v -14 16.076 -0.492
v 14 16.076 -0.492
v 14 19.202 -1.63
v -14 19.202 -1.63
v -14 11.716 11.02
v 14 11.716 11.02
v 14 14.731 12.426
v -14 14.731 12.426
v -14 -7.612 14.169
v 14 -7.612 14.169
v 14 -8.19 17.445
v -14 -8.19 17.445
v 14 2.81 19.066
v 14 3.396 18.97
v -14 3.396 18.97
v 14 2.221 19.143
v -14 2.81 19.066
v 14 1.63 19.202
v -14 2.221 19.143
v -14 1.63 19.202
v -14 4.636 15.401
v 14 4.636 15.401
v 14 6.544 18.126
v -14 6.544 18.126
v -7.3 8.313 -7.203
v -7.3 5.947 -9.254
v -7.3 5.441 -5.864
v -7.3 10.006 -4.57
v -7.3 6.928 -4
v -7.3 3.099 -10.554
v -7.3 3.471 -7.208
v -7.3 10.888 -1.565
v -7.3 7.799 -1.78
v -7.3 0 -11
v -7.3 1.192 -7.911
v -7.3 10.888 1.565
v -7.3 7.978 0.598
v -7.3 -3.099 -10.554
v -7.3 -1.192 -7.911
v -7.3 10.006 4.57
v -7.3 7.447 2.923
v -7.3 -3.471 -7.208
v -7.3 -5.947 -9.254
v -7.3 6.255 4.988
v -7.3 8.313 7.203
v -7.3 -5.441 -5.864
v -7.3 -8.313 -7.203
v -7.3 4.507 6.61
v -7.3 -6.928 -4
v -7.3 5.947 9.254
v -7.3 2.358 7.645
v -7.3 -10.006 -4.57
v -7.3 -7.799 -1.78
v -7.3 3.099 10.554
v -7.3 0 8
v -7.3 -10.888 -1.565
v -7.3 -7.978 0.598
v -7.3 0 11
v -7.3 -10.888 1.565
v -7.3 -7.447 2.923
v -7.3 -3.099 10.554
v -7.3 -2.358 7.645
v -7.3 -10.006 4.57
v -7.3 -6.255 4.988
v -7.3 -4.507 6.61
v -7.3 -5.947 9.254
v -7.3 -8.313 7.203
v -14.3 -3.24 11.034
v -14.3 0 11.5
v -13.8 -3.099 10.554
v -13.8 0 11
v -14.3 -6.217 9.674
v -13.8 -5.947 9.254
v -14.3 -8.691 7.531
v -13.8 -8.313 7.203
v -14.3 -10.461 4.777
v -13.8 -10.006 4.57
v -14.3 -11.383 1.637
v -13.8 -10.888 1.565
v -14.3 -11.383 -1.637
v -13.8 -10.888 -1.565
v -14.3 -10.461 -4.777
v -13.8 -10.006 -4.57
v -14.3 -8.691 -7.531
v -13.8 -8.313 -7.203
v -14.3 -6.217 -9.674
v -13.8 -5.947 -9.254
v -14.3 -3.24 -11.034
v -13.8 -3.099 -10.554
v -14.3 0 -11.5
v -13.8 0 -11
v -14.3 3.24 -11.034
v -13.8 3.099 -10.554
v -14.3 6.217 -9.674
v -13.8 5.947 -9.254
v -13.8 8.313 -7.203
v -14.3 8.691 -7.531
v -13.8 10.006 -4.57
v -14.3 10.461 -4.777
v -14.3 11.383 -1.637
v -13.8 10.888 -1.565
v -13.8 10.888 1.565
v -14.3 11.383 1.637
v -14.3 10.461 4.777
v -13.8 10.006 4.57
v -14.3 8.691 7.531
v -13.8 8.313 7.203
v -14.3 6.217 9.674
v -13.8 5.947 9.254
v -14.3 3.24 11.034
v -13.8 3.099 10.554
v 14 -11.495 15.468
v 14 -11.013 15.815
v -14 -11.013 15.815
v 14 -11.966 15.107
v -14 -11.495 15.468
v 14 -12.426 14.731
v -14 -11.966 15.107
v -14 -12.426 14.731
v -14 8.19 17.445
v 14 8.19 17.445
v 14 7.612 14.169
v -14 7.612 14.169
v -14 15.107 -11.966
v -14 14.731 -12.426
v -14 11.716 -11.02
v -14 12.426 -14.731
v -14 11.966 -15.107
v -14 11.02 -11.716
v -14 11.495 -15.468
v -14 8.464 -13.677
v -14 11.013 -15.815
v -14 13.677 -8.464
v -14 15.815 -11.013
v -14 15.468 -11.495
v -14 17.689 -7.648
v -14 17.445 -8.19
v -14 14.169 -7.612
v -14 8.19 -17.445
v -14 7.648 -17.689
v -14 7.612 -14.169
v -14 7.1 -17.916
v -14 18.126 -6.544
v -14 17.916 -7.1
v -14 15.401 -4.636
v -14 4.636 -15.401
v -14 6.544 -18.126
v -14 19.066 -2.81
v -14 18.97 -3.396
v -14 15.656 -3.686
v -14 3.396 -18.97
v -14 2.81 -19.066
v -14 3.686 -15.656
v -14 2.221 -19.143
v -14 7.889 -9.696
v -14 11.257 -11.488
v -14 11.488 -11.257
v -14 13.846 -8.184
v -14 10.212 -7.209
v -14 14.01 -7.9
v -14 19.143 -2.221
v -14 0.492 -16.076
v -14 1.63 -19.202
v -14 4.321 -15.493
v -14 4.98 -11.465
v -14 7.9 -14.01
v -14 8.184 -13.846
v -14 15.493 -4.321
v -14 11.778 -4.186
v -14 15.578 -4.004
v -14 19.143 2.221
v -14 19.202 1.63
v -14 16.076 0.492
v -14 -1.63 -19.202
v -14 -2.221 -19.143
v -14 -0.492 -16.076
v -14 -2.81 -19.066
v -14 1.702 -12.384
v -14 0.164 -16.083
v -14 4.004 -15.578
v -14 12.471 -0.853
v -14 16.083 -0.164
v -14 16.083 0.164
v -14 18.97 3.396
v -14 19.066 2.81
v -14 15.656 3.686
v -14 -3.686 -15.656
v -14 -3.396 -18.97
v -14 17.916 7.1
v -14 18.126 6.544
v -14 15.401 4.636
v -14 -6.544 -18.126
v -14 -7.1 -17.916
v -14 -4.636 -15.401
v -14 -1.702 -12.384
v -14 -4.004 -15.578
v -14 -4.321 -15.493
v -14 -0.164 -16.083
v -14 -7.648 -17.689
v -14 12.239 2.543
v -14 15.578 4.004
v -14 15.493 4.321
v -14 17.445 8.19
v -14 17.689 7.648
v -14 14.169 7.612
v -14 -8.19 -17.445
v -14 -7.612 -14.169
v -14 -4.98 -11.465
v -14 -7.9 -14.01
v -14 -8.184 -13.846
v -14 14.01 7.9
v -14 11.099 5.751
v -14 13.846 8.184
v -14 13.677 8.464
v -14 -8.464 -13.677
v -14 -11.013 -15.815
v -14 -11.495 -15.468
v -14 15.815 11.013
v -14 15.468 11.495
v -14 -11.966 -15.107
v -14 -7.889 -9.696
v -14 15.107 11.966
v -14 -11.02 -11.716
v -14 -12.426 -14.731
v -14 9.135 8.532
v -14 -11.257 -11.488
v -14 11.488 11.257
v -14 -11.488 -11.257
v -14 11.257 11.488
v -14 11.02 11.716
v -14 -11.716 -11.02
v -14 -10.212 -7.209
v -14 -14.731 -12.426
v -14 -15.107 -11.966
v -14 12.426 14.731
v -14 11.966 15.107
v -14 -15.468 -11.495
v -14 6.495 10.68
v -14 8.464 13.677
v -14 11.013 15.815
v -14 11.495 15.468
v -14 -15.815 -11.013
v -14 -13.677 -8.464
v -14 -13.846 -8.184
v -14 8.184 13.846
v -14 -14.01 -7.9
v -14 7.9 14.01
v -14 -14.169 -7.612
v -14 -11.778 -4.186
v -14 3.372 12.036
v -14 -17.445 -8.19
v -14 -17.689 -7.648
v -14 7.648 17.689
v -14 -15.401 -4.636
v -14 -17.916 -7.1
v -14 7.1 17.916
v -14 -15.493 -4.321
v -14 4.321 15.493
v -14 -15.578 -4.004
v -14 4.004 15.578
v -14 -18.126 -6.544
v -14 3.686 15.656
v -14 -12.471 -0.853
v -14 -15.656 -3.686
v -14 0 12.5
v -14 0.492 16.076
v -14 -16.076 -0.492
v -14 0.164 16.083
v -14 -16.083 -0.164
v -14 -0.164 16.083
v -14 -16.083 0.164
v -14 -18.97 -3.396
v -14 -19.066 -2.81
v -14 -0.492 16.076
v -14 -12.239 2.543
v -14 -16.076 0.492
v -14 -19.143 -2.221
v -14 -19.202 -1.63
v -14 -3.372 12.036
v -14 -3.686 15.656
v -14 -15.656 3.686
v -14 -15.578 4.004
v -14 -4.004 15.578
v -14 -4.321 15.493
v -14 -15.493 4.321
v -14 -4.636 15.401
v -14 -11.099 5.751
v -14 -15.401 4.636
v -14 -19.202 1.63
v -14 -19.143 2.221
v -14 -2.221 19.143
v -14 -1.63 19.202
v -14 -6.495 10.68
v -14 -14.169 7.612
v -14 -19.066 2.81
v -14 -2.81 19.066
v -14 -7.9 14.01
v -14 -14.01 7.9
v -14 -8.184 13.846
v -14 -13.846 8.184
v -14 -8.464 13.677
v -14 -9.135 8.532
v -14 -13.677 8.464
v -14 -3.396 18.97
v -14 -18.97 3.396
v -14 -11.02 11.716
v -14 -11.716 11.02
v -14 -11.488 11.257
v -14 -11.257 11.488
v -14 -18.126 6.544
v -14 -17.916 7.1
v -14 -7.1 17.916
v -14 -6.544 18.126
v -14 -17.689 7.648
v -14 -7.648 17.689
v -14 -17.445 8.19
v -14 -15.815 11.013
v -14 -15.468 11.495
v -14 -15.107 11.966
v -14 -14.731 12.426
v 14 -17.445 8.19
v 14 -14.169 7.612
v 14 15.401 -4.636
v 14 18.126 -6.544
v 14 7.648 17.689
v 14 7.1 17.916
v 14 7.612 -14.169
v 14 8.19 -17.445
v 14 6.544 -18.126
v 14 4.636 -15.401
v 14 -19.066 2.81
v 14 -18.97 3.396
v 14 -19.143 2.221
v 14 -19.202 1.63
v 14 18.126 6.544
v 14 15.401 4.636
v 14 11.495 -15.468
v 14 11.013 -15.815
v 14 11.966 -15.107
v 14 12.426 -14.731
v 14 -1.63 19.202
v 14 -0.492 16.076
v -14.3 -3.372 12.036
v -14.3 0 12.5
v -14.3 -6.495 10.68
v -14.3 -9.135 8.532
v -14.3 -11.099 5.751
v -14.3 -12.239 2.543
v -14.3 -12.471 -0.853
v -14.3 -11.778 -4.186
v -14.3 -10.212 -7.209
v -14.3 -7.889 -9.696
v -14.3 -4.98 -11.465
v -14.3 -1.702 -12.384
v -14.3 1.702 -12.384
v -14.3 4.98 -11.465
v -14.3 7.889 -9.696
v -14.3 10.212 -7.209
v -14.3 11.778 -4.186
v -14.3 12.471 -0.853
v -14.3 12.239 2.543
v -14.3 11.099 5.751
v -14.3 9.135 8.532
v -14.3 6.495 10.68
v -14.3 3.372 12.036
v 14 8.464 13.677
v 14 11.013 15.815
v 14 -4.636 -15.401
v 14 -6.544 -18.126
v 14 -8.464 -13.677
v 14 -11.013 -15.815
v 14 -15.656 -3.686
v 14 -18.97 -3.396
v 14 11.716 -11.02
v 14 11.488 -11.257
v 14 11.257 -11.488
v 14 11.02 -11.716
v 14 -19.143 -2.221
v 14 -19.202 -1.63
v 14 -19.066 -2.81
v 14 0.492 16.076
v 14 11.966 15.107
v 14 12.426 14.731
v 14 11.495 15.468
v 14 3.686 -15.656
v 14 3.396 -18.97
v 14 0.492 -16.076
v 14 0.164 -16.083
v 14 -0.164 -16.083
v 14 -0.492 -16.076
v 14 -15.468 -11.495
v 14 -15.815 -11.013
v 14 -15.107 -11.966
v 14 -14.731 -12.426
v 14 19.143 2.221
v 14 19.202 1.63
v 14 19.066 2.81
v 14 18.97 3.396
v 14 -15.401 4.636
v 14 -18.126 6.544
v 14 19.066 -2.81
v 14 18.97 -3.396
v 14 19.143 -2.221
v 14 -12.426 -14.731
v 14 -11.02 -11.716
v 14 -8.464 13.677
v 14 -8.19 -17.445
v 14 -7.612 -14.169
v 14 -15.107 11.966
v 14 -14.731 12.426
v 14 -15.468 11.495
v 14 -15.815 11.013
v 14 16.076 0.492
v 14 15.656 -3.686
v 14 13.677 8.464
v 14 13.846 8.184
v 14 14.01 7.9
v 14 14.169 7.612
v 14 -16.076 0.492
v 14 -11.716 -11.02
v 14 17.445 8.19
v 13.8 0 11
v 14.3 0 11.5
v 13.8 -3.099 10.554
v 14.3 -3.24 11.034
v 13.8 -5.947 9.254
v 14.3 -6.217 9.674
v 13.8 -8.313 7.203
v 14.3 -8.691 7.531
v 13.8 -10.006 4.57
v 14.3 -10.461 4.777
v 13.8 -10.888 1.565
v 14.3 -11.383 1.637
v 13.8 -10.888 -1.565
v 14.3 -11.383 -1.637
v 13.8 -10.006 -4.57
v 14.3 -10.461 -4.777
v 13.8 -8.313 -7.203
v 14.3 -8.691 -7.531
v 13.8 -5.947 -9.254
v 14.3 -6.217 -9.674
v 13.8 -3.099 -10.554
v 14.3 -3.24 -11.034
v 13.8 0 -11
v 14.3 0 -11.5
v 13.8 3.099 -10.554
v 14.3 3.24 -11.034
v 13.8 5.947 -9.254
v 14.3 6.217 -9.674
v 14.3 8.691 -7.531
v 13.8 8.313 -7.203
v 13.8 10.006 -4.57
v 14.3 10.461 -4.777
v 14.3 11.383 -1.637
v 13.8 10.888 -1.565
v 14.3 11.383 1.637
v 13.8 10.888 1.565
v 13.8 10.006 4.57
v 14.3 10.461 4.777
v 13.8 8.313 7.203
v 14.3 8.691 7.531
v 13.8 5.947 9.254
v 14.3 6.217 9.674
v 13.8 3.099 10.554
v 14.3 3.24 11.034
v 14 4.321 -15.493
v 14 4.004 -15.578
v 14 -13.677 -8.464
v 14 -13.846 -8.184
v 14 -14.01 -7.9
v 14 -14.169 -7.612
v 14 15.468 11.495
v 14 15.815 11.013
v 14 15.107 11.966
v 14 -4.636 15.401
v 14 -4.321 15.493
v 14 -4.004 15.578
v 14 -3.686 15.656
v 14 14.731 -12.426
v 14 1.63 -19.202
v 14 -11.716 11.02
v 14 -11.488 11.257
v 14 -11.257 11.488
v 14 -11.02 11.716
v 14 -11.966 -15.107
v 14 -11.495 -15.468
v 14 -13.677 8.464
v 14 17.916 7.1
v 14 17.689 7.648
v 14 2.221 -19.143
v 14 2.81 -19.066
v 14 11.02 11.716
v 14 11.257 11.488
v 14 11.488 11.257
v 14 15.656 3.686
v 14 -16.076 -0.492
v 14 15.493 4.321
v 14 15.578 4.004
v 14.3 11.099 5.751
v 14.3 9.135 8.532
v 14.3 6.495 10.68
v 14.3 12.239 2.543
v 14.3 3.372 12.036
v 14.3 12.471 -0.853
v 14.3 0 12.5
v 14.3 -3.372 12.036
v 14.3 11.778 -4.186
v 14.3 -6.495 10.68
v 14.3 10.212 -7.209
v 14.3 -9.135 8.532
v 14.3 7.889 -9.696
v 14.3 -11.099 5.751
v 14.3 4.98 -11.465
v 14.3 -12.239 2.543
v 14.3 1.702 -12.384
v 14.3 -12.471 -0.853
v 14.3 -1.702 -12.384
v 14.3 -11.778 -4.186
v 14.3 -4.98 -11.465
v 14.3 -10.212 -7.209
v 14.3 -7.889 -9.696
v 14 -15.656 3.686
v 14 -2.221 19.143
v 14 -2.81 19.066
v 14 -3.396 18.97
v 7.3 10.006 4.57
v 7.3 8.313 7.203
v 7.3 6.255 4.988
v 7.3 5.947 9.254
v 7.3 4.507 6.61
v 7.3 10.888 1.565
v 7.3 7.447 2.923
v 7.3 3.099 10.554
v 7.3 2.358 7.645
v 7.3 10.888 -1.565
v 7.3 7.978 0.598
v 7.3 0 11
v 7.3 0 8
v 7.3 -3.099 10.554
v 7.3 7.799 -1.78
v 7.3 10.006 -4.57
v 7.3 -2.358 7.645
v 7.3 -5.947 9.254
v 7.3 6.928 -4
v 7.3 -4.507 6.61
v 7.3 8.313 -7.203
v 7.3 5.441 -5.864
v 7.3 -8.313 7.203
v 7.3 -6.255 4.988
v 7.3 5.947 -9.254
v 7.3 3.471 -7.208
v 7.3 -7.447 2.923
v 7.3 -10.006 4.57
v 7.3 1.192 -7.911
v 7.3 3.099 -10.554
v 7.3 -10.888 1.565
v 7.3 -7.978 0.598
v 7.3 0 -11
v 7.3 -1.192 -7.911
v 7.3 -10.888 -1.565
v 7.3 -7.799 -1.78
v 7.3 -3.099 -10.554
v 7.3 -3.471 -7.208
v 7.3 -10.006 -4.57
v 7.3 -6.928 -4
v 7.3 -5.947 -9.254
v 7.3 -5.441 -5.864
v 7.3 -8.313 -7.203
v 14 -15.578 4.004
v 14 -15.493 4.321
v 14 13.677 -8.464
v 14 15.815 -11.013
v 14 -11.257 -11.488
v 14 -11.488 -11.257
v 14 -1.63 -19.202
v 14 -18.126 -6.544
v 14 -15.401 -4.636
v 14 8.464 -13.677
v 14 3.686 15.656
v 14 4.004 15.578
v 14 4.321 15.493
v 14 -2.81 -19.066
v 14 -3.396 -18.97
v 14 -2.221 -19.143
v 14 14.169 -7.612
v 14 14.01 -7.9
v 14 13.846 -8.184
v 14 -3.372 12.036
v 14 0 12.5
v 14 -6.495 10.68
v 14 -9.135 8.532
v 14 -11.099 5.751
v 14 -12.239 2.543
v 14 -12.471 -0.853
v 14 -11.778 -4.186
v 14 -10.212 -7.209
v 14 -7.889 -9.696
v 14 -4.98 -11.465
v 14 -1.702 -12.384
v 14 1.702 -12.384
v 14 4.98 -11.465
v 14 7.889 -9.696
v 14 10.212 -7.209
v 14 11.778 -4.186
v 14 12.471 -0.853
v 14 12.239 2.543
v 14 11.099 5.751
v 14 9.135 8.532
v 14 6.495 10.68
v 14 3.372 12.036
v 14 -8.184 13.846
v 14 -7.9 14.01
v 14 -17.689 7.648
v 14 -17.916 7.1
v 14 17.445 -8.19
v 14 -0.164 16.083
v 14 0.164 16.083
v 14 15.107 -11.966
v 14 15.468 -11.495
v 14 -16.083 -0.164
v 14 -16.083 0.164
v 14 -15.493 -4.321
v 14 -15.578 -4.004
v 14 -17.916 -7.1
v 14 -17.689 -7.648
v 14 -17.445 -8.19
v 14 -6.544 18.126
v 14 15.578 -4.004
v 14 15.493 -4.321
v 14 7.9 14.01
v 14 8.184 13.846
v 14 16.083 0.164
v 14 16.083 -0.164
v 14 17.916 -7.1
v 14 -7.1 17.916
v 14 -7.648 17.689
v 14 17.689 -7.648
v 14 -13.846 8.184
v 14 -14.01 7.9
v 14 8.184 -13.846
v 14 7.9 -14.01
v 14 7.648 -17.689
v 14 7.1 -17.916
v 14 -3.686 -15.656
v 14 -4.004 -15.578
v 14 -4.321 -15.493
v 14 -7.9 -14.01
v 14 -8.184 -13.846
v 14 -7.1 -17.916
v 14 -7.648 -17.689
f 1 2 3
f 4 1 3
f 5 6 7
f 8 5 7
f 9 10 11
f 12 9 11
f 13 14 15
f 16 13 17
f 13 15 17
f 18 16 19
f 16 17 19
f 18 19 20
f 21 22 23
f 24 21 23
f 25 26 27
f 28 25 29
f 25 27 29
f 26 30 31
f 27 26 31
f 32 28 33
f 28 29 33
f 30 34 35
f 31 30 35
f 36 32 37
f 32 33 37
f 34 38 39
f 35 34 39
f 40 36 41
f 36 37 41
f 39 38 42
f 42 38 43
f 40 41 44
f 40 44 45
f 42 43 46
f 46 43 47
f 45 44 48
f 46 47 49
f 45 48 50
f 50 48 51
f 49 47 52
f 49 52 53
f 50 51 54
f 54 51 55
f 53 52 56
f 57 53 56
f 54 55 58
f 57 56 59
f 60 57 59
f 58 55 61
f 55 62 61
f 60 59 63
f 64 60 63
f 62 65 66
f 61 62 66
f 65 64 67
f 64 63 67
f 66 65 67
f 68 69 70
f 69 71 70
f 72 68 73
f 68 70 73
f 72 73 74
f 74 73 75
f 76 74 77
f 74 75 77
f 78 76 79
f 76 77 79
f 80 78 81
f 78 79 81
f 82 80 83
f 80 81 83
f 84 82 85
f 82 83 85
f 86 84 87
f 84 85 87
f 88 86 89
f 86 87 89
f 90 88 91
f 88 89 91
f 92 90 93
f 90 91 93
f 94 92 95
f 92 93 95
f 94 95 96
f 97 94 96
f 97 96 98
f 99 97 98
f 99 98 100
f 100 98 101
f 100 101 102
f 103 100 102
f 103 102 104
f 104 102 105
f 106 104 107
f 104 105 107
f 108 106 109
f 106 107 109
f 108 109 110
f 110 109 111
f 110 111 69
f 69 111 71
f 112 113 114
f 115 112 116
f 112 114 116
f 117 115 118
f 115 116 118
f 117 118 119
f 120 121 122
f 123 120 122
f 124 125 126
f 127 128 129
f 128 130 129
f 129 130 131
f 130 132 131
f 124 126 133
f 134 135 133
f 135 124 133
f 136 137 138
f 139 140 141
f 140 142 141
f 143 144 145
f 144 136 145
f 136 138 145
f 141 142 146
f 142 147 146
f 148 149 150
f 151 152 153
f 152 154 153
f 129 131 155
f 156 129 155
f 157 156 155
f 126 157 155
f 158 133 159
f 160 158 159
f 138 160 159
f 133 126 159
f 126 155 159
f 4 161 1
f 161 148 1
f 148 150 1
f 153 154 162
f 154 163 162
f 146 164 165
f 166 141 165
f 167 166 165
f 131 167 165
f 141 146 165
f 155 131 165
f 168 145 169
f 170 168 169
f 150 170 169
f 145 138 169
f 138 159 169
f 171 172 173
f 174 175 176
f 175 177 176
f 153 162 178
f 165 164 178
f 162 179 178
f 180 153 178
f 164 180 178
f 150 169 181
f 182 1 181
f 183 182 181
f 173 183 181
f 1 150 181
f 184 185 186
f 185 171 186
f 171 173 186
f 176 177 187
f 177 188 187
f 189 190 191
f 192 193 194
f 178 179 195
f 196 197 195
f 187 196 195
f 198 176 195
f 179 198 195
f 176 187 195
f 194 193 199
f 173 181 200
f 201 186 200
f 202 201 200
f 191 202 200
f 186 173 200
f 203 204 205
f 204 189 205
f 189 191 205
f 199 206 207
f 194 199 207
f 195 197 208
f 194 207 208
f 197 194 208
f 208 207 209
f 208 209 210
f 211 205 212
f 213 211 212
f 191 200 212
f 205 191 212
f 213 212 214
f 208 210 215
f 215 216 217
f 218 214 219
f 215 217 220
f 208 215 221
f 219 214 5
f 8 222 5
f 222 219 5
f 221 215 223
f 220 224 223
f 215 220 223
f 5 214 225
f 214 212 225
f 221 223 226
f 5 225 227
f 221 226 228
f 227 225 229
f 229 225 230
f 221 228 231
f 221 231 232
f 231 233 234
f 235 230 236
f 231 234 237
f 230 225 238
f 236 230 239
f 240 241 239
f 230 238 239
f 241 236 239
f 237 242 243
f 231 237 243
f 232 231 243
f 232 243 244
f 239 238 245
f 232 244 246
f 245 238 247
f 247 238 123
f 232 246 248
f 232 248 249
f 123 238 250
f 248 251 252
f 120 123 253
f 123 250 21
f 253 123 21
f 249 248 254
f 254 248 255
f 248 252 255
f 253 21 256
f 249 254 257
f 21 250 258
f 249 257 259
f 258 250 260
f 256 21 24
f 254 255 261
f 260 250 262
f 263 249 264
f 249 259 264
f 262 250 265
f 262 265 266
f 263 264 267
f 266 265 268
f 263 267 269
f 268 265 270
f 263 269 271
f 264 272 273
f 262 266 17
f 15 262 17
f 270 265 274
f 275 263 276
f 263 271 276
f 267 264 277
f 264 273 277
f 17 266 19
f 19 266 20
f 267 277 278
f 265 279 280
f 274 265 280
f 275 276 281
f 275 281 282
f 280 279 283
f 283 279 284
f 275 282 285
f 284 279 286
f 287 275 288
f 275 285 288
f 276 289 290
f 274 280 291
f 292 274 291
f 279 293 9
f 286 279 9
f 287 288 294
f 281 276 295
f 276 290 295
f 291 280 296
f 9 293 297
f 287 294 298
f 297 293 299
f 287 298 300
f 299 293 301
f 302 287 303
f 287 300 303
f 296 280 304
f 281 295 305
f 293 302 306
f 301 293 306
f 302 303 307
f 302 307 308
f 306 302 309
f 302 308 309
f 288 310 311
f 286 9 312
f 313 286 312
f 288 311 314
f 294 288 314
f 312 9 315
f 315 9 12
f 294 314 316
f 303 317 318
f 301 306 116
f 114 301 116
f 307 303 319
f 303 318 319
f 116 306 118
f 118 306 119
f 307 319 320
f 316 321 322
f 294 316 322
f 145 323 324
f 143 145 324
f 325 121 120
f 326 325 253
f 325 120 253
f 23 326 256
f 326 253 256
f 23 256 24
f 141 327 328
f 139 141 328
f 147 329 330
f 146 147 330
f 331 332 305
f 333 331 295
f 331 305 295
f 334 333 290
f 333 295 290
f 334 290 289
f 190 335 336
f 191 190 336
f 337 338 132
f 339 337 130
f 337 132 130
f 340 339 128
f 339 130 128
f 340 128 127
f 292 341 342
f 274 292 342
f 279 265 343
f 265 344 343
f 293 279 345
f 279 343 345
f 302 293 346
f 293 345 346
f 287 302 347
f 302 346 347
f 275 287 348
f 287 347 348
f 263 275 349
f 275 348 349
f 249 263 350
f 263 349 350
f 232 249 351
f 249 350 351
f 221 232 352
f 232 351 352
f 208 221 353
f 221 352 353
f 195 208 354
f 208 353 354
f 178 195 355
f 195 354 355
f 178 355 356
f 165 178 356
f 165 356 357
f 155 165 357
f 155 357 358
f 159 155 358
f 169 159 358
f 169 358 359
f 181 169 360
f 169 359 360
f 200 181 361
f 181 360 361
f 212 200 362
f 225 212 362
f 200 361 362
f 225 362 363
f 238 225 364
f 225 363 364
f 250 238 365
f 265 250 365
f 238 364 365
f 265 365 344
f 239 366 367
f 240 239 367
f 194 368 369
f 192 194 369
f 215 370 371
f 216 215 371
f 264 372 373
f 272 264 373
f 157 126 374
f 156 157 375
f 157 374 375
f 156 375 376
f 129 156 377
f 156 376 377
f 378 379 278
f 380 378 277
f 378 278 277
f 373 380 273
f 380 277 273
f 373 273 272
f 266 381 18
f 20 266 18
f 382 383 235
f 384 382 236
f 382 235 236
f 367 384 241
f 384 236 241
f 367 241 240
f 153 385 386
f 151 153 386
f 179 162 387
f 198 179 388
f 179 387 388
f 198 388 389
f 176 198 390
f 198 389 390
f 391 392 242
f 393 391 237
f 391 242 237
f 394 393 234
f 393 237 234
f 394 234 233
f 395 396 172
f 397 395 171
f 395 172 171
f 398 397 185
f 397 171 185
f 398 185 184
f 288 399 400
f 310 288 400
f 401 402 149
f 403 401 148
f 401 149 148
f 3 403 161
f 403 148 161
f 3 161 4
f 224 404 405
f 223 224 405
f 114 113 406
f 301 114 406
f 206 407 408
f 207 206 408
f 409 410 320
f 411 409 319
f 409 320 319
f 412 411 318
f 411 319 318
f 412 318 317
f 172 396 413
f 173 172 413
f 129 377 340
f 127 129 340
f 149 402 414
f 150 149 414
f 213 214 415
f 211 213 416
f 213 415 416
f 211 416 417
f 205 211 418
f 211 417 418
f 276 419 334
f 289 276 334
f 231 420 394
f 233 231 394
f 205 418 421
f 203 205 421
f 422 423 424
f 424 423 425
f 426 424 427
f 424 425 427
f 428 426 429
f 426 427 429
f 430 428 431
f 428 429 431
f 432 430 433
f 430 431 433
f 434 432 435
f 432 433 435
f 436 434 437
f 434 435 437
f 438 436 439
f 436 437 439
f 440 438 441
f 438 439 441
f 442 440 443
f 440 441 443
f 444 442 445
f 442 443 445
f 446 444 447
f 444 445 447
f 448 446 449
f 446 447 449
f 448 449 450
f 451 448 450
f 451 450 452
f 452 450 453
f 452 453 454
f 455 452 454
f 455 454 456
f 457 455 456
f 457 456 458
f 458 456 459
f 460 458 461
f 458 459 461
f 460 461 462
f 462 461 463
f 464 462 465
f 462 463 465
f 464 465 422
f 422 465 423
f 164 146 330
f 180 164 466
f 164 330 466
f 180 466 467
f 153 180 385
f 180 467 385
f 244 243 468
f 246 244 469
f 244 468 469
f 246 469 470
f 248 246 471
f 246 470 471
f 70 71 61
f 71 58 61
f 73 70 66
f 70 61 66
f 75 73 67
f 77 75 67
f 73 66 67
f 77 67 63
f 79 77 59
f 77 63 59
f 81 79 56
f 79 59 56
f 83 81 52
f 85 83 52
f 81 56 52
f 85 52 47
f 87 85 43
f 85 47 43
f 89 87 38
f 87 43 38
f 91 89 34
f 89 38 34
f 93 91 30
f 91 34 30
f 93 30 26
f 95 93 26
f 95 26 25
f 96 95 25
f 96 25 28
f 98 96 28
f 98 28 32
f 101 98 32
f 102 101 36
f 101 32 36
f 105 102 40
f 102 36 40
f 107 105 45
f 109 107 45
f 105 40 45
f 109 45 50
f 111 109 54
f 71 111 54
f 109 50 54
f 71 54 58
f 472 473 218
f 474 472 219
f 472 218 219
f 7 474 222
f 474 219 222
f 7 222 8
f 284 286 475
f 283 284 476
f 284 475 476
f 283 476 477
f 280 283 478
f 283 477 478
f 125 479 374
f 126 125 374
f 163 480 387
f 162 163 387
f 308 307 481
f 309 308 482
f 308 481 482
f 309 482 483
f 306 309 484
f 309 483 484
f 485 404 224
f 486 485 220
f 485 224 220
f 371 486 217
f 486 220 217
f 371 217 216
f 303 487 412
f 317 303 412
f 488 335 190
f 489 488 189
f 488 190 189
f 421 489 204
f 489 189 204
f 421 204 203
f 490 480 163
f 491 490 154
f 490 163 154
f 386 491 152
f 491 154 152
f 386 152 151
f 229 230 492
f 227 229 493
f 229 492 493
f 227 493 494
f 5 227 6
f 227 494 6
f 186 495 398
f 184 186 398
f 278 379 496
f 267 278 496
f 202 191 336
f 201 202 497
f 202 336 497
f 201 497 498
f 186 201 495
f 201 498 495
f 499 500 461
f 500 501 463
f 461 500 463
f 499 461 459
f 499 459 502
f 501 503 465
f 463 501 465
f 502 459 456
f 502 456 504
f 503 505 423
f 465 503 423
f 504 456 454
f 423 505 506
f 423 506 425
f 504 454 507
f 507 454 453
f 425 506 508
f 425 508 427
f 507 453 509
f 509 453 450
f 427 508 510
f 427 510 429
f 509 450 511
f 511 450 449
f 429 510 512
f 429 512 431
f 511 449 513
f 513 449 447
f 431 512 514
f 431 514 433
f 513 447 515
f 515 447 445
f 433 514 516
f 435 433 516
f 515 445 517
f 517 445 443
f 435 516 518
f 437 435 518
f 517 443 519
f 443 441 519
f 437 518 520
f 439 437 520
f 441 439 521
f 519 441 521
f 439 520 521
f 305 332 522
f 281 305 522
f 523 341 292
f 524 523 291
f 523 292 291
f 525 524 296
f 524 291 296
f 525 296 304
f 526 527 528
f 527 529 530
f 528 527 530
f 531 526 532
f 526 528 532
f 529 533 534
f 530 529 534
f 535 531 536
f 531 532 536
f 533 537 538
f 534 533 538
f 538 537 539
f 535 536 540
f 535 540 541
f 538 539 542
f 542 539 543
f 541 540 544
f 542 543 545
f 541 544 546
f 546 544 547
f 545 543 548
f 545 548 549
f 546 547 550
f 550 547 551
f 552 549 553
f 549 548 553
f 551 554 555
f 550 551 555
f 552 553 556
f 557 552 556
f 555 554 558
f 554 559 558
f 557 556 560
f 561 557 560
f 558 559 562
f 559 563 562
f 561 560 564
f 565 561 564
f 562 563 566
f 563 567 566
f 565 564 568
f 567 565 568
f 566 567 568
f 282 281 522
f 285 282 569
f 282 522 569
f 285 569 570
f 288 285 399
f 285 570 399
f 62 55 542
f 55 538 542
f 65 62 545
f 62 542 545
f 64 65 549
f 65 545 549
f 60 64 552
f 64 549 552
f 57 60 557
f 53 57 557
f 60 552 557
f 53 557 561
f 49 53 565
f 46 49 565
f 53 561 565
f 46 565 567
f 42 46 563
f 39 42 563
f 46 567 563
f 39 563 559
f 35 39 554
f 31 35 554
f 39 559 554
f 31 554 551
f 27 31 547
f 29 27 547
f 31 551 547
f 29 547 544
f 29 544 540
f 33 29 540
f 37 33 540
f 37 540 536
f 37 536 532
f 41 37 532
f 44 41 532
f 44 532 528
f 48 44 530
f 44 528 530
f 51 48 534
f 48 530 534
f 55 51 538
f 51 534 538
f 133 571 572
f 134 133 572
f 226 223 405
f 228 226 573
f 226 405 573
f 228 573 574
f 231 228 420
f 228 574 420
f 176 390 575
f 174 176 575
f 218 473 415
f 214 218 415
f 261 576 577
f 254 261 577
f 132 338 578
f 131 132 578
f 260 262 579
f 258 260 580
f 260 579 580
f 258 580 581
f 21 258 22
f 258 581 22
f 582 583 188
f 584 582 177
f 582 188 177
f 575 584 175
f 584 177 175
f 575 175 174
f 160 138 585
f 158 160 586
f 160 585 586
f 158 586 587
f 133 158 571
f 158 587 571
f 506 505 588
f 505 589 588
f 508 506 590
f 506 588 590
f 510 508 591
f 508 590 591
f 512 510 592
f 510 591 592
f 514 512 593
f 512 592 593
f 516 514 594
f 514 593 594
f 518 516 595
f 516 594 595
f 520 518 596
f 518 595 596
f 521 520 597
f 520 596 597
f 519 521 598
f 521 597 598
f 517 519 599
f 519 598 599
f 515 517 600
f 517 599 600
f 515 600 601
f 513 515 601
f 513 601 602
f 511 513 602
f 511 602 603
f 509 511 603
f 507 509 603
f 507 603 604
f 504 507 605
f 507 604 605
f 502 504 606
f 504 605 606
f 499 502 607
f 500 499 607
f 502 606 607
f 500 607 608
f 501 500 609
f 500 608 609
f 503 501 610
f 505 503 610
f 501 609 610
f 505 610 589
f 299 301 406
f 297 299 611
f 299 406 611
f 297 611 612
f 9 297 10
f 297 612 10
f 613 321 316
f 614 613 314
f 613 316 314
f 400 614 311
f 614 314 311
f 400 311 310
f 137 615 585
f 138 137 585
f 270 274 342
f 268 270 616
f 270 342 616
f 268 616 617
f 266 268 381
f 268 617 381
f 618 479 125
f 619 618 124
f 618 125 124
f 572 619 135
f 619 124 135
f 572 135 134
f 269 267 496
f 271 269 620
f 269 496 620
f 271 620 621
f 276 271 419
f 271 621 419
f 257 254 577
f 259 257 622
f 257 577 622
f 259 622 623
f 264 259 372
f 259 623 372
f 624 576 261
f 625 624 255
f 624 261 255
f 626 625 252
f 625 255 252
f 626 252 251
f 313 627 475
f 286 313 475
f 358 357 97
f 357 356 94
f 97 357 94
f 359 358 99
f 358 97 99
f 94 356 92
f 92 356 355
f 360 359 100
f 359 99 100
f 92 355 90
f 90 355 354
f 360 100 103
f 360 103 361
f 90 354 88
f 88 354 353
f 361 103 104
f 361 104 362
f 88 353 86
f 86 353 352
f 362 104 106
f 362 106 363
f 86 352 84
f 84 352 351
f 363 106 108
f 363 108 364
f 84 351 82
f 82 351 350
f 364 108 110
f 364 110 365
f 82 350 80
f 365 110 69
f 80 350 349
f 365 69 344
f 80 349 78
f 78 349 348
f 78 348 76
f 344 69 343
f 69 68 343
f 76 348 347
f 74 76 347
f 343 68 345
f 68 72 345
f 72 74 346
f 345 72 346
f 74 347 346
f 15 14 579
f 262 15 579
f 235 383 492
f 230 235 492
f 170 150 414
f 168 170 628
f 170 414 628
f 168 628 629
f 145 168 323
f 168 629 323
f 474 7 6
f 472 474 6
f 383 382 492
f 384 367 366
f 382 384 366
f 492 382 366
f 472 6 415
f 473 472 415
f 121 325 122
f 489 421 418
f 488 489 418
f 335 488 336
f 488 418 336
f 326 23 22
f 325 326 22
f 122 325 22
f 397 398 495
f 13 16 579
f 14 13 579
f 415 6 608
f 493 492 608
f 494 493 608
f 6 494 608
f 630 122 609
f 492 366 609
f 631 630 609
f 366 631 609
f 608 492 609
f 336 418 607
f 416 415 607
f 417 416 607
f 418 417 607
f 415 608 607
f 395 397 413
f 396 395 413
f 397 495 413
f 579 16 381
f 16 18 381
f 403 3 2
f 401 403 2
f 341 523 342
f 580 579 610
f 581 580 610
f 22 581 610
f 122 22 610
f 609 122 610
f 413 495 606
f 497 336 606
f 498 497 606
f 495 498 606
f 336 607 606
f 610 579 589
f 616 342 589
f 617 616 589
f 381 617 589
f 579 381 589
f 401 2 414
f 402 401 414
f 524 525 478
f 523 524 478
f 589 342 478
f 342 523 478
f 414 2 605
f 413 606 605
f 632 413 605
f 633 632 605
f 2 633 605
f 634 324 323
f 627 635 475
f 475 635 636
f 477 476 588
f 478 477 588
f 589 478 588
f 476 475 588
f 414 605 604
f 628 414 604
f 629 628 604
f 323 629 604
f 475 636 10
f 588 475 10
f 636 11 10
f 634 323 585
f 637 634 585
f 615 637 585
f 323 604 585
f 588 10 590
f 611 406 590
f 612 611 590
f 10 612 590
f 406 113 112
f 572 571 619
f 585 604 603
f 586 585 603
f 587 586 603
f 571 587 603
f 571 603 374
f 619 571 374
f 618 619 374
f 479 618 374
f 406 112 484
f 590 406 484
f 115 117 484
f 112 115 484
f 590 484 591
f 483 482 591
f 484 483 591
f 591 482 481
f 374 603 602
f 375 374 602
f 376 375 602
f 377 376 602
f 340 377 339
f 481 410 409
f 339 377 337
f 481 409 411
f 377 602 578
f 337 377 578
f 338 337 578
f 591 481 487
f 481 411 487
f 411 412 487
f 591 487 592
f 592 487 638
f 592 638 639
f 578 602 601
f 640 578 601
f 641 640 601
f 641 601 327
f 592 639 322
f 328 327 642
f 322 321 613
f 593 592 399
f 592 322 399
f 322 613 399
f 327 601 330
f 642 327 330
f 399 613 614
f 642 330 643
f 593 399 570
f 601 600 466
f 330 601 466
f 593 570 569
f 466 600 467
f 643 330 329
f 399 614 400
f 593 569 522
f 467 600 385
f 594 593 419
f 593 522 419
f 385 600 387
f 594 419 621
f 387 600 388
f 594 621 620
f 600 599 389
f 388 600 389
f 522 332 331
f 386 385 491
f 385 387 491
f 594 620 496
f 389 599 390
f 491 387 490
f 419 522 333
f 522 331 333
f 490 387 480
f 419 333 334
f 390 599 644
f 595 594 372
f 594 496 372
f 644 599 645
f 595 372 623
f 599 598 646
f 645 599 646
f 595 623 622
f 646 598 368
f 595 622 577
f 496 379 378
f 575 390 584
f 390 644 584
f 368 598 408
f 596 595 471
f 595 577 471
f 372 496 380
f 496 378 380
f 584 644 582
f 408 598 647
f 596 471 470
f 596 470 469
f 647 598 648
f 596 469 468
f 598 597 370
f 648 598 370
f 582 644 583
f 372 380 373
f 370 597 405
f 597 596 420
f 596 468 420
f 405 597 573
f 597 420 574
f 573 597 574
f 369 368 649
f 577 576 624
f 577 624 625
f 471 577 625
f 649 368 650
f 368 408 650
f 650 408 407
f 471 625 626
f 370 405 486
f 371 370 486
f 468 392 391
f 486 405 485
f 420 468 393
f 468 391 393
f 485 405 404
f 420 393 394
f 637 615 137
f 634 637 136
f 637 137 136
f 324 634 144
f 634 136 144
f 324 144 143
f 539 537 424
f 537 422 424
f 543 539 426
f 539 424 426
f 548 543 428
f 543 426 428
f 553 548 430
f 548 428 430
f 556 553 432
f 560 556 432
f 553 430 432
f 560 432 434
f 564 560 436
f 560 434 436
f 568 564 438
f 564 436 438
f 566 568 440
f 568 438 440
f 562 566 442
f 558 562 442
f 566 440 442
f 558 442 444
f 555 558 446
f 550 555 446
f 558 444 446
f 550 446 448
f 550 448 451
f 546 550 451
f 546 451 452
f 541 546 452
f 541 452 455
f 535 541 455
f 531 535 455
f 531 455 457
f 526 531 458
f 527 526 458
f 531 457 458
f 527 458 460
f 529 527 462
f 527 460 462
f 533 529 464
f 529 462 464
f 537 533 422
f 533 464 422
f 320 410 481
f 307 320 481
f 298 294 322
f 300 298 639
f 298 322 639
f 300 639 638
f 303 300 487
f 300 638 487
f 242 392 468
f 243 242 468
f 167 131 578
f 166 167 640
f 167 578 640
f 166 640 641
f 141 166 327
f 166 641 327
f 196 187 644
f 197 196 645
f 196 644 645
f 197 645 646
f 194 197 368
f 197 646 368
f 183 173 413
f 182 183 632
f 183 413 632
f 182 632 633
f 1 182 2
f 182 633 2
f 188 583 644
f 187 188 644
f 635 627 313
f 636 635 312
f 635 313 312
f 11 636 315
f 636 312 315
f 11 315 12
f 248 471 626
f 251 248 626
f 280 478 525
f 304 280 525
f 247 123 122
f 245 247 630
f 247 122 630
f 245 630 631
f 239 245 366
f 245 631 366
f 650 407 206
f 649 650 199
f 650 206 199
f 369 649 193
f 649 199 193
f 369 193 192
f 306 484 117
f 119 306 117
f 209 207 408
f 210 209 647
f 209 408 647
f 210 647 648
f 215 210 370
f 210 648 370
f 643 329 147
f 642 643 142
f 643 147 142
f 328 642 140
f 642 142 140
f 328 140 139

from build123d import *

# Parameters (mm, degrees)
SCHNITT_LINEAR_AUSTRAGEN1_REACH = 41.29
KREISMUSTER1_COUNT              = 24


with BuildPart() as part:
    # Skizze1 → Rotation1 (revolve)
    with BuildSketch(Plane.XY):
        Polygon((-14.3, 12.5), (-14.3, 11.5), (-13.8, 11), (-7.3, 11), (-7.3, 8), (7.3, 8), (7.3, 11), (13.8, 11), (14.3, 11.5), (14.3, 12.5), (14, 12.5), (14, 19.2715), (-14, 19.2715), (-14, 12.5), align=None)
    revolve(axis=Axis((-36.010442658, 0, 0), (1, 0, 0)))

    # Skizze2 → Schnitt-Linear austragen1 (cut, up to next)
    with BuildSketch(Plane(origin=(14, 0, 0), x_dir=(0, 0, -1), z_dir=(1, 0, 0)), mode=Mode.PRIVATE) as schnitt_linear_austragen1_sk1:
        with BuildLine():
            Line((0.491939129, 16.076475108), (1.629707388, 19.202467708))
            ThreePointArc((1.629707388, 19.202467708), (0, 19.2715), (-1.629707388, 19.202467708))
            Line((-1.629707388, 19.202467708), (-0.491939129, 16.076475108))
            ThreePointArc((-0.491939129, 16.076475108), (0, 16.084), (0.491939129, 16.076475108))
        make_face()
    schnitt_linear_austragen1_tool1 = extrude(schnitt_linear_austragen1_sk1.sketch, amount=-SCHNITT_LINEAR_AUSTRAGEN1_REACH, mode=Mode.PRIVATE) & part.part
    schnitt_linear_austragen1 = schnitt_linear_austragen1_tool1.solids().sort_by_distance((14, 17.949237, 0))[0]
    add(schnitt_linear_austragen1, mode=Mode.SUBTRACT)

    # Kreismuster1: Schnitt-Linear austragen1 ×24 about axis
    kreismuster1_axis = Axis((-15.73, 0, 0), (1, 0, 0))
    for i in range(1, KREISMUSTER1_COUNT):
        add(schnitt_linear_austragen1.rotate(kreismuster1_axis, i * 360 / KREISMUSTER1_COUNT), mode=Mode.SUBTRACT)


solid = part.part
